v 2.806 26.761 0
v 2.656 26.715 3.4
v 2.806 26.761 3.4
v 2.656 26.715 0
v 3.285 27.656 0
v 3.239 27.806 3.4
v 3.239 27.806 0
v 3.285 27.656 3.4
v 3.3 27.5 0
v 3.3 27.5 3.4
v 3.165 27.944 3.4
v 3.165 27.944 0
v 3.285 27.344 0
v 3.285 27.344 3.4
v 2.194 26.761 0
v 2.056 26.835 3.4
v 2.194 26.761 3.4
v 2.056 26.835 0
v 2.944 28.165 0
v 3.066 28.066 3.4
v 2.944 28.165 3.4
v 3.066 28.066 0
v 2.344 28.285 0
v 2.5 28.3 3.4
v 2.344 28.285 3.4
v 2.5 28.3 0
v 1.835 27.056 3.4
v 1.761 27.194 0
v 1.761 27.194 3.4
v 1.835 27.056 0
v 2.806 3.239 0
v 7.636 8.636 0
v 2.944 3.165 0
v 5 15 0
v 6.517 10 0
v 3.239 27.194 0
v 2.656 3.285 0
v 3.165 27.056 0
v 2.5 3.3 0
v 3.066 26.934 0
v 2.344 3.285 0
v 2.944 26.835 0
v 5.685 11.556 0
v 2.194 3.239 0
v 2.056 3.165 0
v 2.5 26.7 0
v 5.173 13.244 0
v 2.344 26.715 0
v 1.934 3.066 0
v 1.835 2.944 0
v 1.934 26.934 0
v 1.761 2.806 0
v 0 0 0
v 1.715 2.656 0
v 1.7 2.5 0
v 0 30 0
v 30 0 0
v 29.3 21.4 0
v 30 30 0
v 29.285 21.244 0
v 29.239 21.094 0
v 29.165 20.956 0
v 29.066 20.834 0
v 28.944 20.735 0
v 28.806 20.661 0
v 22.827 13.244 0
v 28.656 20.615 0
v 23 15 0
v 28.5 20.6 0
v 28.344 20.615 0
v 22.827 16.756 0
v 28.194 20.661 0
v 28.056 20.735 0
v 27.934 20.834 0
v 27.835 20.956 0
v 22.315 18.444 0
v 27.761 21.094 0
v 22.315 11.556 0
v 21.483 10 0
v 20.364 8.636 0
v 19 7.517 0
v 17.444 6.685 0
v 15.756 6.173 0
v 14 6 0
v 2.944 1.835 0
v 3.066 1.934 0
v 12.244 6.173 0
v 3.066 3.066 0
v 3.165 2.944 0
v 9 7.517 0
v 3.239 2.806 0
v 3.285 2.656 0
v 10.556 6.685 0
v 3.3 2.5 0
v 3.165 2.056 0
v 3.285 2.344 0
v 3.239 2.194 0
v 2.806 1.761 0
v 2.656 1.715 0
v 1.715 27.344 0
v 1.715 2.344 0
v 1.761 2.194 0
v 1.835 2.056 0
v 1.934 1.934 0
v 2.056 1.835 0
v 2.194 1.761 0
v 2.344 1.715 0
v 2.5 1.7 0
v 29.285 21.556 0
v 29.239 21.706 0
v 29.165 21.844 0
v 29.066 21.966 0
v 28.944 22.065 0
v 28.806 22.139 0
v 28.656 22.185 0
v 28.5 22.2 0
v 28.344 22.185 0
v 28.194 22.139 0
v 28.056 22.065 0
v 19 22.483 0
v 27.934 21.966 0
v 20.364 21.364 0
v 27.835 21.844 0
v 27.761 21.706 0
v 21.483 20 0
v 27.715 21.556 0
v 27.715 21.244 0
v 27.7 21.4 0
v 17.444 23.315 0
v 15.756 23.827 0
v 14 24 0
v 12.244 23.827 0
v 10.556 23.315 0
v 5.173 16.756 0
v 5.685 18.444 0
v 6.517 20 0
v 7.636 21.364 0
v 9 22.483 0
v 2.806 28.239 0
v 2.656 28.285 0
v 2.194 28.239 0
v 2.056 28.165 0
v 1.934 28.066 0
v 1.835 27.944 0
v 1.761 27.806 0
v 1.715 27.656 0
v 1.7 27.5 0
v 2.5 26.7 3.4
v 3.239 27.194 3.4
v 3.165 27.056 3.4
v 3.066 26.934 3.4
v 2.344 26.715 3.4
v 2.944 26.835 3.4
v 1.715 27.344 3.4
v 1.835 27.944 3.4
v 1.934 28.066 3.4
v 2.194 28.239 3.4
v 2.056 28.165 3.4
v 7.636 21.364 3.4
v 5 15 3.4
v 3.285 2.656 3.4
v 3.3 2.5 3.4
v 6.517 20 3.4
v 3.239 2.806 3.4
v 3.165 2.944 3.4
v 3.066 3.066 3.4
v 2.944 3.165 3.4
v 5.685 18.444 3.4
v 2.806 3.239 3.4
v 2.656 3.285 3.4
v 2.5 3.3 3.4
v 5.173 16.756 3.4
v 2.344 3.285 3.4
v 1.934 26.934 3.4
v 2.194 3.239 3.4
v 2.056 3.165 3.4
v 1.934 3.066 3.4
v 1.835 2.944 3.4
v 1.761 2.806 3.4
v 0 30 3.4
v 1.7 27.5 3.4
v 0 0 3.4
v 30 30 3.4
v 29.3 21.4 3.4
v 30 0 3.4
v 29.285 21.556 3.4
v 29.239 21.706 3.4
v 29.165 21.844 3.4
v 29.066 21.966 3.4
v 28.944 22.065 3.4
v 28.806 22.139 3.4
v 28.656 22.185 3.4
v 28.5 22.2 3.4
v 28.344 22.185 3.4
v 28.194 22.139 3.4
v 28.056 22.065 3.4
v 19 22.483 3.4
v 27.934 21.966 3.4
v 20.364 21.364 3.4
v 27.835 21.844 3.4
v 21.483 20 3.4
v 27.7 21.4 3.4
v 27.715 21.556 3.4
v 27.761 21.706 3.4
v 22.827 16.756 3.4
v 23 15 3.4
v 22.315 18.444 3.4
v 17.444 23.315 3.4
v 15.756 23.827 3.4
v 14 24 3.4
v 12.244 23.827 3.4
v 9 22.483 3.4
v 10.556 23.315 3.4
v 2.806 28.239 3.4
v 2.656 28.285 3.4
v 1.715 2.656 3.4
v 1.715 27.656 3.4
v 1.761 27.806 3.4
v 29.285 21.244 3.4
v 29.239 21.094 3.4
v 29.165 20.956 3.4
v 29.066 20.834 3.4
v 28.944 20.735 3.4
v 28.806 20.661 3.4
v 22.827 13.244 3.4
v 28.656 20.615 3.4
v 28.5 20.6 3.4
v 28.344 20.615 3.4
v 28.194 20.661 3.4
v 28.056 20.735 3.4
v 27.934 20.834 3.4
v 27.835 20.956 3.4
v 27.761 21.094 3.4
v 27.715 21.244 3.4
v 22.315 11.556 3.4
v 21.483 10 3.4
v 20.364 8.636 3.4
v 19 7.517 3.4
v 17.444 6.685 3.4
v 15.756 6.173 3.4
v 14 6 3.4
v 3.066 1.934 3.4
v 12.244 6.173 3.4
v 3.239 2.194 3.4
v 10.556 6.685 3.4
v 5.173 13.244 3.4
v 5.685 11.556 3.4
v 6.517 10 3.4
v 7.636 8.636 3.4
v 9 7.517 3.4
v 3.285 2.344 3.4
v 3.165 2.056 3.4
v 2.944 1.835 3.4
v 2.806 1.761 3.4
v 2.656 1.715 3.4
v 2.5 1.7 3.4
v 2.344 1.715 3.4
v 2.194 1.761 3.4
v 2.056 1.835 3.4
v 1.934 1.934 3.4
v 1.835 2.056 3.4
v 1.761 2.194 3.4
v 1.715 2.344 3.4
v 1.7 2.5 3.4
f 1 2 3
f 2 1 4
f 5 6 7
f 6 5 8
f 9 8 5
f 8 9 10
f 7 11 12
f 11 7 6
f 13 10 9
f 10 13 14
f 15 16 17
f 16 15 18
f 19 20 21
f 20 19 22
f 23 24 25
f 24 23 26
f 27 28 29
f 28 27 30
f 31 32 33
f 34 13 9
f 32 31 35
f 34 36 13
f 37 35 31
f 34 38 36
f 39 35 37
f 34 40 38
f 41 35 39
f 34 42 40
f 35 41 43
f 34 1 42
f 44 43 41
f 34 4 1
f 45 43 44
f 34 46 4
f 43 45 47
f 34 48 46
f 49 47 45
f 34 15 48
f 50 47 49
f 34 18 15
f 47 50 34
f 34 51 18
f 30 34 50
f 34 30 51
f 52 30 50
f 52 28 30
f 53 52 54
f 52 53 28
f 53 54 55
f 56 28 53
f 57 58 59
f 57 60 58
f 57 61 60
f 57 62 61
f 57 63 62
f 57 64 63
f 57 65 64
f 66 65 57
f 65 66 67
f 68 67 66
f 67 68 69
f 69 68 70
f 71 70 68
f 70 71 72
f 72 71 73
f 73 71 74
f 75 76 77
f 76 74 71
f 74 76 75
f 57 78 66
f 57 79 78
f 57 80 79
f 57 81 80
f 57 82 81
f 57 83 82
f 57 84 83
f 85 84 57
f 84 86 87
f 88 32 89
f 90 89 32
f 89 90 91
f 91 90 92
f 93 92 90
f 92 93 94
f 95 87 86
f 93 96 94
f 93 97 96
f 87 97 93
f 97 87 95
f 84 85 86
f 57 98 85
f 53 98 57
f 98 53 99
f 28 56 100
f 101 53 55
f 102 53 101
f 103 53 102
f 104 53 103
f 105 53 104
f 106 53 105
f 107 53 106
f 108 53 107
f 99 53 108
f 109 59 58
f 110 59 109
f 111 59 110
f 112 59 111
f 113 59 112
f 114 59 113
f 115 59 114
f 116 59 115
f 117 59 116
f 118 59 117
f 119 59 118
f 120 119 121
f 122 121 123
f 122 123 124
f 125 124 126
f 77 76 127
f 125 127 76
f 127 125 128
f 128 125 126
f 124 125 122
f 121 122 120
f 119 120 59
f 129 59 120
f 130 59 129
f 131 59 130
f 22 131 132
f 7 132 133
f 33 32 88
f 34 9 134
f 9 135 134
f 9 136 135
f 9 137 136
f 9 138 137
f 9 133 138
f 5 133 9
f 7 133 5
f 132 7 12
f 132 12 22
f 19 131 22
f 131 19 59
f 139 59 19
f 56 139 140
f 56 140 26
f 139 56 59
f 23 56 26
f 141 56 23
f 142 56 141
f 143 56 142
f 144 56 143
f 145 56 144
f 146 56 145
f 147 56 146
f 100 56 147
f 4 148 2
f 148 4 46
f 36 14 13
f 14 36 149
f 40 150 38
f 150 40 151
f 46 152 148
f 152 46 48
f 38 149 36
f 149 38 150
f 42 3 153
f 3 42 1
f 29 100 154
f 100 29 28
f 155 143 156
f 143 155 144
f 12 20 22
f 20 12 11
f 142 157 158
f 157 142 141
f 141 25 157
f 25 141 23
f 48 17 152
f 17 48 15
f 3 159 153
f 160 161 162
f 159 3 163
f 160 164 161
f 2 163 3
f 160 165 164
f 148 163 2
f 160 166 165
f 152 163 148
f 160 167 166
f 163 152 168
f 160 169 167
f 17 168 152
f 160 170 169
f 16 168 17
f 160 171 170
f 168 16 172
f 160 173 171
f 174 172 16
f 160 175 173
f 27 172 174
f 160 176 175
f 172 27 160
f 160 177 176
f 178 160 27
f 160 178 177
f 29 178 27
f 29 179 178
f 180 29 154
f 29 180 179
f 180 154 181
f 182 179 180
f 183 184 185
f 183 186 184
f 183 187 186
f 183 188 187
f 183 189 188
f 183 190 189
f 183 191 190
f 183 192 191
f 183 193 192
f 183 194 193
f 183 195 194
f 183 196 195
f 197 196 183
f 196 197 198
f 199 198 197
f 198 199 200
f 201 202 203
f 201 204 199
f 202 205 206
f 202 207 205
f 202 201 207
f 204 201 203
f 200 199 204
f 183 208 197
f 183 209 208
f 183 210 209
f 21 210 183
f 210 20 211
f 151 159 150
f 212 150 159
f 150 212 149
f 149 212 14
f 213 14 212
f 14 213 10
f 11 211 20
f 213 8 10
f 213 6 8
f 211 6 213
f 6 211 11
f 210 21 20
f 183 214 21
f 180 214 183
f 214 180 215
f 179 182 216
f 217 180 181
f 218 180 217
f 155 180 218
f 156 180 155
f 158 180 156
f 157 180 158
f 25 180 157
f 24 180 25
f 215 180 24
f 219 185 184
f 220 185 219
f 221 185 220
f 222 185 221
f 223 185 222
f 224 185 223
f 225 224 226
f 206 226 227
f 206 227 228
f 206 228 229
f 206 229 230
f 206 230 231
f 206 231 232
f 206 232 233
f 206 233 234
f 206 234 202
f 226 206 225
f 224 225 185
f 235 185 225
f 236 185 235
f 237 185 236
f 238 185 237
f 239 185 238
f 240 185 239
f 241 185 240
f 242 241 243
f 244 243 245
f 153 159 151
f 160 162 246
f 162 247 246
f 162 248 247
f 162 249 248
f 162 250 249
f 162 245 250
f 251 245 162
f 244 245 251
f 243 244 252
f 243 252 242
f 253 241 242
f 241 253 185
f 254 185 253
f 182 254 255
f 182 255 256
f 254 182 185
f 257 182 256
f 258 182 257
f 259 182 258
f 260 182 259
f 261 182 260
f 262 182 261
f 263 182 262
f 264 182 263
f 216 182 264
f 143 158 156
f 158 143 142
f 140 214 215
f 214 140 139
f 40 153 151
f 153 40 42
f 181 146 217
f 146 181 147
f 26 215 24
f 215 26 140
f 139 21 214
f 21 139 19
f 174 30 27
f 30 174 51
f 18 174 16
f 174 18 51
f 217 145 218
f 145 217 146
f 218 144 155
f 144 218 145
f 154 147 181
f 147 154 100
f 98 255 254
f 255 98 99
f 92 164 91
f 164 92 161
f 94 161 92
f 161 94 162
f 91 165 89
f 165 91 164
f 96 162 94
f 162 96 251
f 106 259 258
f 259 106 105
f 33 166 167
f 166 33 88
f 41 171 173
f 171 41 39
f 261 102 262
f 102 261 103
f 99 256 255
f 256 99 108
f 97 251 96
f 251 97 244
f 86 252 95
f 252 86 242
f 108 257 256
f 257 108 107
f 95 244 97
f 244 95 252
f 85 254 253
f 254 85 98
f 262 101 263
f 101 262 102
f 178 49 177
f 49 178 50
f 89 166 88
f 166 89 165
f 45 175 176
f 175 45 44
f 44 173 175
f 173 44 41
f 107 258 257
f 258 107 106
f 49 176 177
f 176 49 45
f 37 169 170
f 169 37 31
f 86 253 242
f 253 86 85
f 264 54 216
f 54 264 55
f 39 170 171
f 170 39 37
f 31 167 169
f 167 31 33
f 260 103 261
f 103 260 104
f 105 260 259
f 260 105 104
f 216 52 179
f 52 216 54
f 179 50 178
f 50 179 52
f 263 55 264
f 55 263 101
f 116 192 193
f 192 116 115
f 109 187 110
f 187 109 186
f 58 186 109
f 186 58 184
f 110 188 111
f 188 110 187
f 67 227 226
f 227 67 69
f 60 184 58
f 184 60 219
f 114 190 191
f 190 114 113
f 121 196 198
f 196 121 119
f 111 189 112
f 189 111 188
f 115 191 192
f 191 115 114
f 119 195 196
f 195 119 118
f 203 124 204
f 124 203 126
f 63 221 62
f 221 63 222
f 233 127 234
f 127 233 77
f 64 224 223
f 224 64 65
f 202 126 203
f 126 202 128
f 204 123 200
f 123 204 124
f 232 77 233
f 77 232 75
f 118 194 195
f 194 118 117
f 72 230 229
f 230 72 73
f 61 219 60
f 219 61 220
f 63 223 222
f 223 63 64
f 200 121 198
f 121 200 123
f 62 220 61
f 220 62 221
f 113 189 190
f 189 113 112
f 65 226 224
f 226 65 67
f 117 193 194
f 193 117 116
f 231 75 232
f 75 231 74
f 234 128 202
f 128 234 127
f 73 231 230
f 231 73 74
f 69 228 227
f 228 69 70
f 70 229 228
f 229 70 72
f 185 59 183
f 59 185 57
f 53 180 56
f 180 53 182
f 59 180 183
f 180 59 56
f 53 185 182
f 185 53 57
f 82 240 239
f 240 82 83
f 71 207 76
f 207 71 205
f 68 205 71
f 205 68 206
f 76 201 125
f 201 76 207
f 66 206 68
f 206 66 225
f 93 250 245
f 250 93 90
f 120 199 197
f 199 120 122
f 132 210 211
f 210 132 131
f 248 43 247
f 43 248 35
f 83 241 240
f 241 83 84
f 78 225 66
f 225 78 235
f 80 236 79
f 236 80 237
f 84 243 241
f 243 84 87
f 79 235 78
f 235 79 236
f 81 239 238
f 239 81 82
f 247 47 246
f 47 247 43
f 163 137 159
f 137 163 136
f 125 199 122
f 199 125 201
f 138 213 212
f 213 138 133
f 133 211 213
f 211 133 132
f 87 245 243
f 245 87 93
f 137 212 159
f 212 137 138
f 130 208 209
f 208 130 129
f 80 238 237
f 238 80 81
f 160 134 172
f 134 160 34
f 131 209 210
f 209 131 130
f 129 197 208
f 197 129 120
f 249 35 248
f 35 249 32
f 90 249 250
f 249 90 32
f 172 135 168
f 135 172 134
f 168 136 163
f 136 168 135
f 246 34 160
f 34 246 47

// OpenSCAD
//lol my idea for a fan duct in the cartridge slot.

$fn=32;

//measurements

//cart lip z
cz=8;

//between case plastic and top of cartridge "notches"
//py=39;

//from bottom of lower peg to cart top lip
py=27-4;

//outside cartridge slot y
mx=61.6;

//px=0; //redefined later.

//cart plate thickness
pz=1.6;

//lower mount offset x
lmox=62;

// upper left mount offset y (from lower)
ulmoy=19;

// upper right mount offset y (from lower)
urmoy=13;

// mount diameter
md=4;

//plate-x
px=lmox+md;

//fan dimensions
fx=30;
fy=30;
fz=3.4;
//aperture
fad=18;
//aperture x offset
faxo=-1;

//fan y offset
fyo=2;

//mount hole dia
fmhd=1.6;

//mount hole coord
//top
ftmhy=27.5;
ftmhx=2.5;

//side
fsmhy=2.5;
fsmhx=2.5;

//lower
flmhy=6.4+fx/2;
flmhx=28.5;

//hold diameter
hd=1.8;

//shroud stuff
//wall thickness
wt=1.2;

//heatsink
hsx=17;
hsy=17;
hsz=6;

//cpu
cpuxo=-3;

//duct extra y
dey=2;

//for other modules
hclearance=8.6;
vclearance=14.25;

fan();
module fan() {
    difference() {
        //fan body
        cube([fx,fy,fz]);
        // fan aperture
        translate([fx/2+faxo,fy/2,0])
        cylinder(d=fad, h=fz);
    fan_mount_holes(); 
    }
}


module fan_mount_holes() {
    //top
    translate([ftmhx,ftmhy,0])
    cylinder(d=fmhd, h=fz);
    
    //side
    translate([fsmhx,fsmhy,0])
    cylinder(d=fmhd, h=fz);

    //lower
    translate([flmhx,flmhy,0])
    cylinder(d=fmhd, h=fz);
    
}
